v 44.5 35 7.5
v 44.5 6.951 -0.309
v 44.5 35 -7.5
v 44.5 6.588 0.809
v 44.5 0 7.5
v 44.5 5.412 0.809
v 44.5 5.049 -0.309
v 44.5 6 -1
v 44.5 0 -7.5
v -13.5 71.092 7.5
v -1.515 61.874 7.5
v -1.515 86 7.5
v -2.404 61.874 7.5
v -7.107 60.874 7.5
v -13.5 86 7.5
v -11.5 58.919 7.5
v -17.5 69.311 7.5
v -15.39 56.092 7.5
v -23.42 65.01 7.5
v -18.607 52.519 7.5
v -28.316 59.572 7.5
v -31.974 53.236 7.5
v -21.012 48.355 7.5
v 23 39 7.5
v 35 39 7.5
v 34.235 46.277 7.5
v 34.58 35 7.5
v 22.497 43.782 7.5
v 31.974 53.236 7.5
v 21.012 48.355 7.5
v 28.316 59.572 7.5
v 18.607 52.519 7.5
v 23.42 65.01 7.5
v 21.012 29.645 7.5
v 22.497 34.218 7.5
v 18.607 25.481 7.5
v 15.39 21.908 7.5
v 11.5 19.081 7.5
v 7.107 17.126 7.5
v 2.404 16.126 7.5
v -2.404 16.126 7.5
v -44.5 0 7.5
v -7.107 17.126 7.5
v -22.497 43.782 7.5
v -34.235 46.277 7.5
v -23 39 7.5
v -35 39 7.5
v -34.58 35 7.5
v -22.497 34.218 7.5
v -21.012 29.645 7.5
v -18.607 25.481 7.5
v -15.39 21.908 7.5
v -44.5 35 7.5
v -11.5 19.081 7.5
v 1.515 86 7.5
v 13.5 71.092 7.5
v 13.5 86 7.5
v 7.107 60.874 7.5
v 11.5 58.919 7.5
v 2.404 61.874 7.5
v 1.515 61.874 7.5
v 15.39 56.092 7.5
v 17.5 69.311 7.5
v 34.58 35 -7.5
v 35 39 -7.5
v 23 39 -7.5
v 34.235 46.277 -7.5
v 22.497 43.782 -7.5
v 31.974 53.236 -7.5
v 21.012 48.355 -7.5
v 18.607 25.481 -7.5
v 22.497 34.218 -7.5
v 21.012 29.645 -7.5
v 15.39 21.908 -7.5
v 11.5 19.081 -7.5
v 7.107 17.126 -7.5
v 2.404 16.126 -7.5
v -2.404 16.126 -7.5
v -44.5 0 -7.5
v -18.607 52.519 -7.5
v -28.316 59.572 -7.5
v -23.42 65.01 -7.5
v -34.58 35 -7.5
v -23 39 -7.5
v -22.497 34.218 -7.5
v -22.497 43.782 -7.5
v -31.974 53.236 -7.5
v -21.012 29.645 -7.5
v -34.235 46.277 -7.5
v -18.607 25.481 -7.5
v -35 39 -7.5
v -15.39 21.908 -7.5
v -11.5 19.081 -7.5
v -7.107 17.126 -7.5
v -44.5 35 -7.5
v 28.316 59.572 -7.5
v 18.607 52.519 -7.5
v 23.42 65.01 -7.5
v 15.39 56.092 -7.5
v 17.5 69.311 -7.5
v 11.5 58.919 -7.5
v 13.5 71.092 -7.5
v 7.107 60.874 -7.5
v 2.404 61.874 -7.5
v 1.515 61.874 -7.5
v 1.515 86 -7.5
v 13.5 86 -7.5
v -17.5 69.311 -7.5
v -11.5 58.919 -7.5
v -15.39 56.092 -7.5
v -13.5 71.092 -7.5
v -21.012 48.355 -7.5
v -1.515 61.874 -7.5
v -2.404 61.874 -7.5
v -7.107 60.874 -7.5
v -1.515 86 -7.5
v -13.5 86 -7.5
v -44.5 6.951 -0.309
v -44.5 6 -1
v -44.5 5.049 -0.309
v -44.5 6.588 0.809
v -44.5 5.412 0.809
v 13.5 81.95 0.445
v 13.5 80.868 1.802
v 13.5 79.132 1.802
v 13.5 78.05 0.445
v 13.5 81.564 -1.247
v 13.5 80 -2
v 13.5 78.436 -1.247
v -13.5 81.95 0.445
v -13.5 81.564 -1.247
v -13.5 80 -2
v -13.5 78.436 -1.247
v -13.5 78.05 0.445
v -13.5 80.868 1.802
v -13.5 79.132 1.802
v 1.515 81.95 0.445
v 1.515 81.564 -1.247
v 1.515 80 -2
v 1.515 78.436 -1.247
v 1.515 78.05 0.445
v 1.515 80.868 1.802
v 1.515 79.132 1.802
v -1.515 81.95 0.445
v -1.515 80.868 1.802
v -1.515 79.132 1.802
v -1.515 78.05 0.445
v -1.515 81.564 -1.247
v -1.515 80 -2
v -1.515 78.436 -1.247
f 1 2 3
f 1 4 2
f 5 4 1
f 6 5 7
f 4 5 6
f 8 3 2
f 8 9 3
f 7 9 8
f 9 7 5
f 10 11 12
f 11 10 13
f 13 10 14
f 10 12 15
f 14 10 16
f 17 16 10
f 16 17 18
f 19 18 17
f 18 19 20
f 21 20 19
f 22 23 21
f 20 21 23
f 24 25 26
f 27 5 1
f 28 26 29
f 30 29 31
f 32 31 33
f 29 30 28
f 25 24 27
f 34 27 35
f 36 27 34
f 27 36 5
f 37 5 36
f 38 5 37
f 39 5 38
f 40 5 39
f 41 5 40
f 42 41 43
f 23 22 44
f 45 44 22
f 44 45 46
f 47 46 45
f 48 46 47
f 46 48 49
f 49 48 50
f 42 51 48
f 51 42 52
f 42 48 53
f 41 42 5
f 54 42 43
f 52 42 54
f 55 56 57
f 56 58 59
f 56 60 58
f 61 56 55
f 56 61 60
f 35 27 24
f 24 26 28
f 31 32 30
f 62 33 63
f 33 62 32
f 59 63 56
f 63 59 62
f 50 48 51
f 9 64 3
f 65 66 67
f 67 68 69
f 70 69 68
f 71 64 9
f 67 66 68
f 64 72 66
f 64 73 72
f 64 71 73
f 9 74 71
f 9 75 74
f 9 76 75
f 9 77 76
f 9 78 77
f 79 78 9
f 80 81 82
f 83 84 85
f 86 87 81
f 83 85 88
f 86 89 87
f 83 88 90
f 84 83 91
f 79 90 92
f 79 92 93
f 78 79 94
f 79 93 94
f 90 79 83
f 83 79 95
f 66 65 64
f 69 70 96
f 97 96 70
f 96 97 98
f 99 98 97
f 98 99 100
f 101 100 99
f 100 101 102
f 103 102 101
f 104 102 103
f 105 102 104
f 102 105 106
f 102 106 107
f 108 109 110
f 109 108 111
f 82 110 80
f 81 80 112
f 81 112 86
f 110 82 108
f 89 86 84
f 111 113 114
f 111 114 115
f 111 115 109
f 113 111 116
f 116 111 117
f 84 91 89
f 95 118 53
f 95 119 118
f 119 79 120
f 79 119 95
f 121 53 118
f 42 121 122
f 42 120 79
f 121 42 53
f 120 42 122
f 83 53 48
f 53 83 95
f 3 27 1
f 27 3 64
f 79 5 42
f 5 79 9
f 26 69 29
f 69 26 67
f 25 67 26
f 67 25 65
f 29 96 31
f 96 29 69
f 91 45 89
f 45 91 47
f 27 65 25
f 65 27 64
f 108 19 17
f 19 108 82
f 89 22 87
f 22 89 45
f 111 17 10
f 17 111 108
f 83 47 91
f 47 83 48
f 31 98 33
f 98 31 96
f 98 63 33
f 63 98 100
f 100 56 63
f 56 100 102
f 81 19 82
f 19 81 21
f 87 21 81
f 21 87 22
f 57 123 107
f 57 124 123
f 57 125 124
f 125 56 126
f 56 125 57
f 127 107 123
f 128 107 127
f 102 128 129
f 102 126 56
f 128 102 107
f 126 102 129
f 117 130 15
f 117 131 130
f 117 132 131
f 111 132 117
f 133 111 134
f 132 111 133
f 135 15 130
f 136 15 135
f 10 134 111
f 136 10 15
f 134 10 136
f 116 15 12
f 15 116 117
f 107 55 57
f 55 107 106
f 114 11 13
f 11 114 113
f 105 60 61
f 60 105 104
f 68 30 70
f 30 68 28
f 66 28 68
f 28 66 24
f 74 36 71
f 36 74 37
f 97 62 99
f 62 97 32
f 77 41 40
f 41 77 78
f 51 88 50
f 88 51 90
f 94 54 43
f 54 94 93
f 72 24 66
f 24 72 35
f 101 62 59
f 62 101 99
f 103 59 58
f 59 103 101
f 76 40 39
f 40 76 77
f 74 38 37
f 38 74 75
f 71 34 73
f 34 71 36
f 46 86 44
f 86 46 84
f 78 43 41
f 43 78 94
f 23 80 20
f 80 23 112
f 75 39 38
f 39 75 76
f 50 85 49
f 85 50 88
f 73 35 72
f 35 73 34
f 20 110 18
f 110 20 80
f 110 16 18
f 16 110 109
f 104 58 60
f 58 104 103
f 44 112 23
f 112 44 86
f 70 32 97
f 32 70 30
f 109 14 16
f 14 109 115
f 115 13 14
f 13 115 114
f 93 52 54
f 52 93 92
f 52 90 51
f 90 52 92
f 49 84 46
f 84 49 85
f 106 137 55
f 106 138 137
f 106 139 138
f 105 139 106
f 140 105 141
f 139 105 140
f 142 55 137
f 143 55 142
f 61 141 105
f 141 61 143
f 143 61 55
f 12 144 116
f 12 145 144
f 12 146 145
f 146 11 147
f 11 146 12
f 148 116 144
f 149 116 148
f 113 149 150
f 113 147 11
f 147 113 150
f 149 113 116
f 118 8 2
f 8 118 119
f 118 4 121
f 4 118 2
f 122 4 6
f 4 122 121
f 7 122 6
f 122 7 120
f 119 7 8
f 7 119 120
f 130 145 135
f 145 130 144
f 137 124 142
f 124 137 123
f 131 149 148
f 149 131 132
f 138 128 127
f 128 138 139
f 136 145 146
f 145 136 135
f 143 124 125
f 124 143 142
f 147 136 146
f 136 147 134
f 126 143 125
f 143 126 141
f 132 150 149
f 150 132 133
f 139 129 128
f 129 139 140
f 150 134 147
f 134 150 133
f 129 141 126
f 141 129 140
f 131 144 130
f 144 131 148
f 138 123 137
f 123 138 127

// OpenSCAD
htotal = 15;

dagujero = 46; // diametro de la herramienta
eagujero = 12; // espesor de lo que aprieta a la herramienta
dtotal = dagujero + 2*eagujero;

egap = 3;

xtotal = 89;
ytotal = 35;
yoffset = 16;  // separacion de la herramienta con la pared

dagujerolateral = 2;
yagujerolateral = 6;

dagujeroapretar = 4;

apretar = 12; // dimensiones de los cubos para apretar


difference() {
    union() {
        // base cuadrada
        translate([0, ytotal/2, 0])
            cube([xtotal, ytotal, htotal], center=true);
        // parte redonda
        translate([0, yoffset + dtotal/2-eagujero, 0])
            cylinder(h=htotal, d=dtotal, center=true);
        // apretador
        translate([0, yoffset + dagujero + (apretar+eagujero)/2, 0])
            cube([apretar*2+egap, apretar+eagujero, htotal], center=true);
    }
    // agujero para herramienta
    translate([0, yoffset + dagujero/2, 0])
        cylinder(h=htotal*1.01, d=dagujero, center=true);
    // gap para apretar
    translate([0, yoffset+dagujero+(eagujero+apretar)/2, 0])
        cube([egap*1.01, (eagujero+apretar)*1.02, htotal*1.01], center=true);
    // agujeros laterales para sostener con base
    translate([0, yagujerolateral, 0])
        rotate([0, 90, 0])
            cylinder(h=xtotal*1.01, d=dagujerolateral, center=true);
    // agujeros laterales para apretar herramienta
    translate([0, yoffset + dagujero + eagujero + apretar/2, 0])
        rotate([0, 90, 0])
            cylinder(h=xtotal*1.01, d=dagujeroapretar, center=true);
    
}
